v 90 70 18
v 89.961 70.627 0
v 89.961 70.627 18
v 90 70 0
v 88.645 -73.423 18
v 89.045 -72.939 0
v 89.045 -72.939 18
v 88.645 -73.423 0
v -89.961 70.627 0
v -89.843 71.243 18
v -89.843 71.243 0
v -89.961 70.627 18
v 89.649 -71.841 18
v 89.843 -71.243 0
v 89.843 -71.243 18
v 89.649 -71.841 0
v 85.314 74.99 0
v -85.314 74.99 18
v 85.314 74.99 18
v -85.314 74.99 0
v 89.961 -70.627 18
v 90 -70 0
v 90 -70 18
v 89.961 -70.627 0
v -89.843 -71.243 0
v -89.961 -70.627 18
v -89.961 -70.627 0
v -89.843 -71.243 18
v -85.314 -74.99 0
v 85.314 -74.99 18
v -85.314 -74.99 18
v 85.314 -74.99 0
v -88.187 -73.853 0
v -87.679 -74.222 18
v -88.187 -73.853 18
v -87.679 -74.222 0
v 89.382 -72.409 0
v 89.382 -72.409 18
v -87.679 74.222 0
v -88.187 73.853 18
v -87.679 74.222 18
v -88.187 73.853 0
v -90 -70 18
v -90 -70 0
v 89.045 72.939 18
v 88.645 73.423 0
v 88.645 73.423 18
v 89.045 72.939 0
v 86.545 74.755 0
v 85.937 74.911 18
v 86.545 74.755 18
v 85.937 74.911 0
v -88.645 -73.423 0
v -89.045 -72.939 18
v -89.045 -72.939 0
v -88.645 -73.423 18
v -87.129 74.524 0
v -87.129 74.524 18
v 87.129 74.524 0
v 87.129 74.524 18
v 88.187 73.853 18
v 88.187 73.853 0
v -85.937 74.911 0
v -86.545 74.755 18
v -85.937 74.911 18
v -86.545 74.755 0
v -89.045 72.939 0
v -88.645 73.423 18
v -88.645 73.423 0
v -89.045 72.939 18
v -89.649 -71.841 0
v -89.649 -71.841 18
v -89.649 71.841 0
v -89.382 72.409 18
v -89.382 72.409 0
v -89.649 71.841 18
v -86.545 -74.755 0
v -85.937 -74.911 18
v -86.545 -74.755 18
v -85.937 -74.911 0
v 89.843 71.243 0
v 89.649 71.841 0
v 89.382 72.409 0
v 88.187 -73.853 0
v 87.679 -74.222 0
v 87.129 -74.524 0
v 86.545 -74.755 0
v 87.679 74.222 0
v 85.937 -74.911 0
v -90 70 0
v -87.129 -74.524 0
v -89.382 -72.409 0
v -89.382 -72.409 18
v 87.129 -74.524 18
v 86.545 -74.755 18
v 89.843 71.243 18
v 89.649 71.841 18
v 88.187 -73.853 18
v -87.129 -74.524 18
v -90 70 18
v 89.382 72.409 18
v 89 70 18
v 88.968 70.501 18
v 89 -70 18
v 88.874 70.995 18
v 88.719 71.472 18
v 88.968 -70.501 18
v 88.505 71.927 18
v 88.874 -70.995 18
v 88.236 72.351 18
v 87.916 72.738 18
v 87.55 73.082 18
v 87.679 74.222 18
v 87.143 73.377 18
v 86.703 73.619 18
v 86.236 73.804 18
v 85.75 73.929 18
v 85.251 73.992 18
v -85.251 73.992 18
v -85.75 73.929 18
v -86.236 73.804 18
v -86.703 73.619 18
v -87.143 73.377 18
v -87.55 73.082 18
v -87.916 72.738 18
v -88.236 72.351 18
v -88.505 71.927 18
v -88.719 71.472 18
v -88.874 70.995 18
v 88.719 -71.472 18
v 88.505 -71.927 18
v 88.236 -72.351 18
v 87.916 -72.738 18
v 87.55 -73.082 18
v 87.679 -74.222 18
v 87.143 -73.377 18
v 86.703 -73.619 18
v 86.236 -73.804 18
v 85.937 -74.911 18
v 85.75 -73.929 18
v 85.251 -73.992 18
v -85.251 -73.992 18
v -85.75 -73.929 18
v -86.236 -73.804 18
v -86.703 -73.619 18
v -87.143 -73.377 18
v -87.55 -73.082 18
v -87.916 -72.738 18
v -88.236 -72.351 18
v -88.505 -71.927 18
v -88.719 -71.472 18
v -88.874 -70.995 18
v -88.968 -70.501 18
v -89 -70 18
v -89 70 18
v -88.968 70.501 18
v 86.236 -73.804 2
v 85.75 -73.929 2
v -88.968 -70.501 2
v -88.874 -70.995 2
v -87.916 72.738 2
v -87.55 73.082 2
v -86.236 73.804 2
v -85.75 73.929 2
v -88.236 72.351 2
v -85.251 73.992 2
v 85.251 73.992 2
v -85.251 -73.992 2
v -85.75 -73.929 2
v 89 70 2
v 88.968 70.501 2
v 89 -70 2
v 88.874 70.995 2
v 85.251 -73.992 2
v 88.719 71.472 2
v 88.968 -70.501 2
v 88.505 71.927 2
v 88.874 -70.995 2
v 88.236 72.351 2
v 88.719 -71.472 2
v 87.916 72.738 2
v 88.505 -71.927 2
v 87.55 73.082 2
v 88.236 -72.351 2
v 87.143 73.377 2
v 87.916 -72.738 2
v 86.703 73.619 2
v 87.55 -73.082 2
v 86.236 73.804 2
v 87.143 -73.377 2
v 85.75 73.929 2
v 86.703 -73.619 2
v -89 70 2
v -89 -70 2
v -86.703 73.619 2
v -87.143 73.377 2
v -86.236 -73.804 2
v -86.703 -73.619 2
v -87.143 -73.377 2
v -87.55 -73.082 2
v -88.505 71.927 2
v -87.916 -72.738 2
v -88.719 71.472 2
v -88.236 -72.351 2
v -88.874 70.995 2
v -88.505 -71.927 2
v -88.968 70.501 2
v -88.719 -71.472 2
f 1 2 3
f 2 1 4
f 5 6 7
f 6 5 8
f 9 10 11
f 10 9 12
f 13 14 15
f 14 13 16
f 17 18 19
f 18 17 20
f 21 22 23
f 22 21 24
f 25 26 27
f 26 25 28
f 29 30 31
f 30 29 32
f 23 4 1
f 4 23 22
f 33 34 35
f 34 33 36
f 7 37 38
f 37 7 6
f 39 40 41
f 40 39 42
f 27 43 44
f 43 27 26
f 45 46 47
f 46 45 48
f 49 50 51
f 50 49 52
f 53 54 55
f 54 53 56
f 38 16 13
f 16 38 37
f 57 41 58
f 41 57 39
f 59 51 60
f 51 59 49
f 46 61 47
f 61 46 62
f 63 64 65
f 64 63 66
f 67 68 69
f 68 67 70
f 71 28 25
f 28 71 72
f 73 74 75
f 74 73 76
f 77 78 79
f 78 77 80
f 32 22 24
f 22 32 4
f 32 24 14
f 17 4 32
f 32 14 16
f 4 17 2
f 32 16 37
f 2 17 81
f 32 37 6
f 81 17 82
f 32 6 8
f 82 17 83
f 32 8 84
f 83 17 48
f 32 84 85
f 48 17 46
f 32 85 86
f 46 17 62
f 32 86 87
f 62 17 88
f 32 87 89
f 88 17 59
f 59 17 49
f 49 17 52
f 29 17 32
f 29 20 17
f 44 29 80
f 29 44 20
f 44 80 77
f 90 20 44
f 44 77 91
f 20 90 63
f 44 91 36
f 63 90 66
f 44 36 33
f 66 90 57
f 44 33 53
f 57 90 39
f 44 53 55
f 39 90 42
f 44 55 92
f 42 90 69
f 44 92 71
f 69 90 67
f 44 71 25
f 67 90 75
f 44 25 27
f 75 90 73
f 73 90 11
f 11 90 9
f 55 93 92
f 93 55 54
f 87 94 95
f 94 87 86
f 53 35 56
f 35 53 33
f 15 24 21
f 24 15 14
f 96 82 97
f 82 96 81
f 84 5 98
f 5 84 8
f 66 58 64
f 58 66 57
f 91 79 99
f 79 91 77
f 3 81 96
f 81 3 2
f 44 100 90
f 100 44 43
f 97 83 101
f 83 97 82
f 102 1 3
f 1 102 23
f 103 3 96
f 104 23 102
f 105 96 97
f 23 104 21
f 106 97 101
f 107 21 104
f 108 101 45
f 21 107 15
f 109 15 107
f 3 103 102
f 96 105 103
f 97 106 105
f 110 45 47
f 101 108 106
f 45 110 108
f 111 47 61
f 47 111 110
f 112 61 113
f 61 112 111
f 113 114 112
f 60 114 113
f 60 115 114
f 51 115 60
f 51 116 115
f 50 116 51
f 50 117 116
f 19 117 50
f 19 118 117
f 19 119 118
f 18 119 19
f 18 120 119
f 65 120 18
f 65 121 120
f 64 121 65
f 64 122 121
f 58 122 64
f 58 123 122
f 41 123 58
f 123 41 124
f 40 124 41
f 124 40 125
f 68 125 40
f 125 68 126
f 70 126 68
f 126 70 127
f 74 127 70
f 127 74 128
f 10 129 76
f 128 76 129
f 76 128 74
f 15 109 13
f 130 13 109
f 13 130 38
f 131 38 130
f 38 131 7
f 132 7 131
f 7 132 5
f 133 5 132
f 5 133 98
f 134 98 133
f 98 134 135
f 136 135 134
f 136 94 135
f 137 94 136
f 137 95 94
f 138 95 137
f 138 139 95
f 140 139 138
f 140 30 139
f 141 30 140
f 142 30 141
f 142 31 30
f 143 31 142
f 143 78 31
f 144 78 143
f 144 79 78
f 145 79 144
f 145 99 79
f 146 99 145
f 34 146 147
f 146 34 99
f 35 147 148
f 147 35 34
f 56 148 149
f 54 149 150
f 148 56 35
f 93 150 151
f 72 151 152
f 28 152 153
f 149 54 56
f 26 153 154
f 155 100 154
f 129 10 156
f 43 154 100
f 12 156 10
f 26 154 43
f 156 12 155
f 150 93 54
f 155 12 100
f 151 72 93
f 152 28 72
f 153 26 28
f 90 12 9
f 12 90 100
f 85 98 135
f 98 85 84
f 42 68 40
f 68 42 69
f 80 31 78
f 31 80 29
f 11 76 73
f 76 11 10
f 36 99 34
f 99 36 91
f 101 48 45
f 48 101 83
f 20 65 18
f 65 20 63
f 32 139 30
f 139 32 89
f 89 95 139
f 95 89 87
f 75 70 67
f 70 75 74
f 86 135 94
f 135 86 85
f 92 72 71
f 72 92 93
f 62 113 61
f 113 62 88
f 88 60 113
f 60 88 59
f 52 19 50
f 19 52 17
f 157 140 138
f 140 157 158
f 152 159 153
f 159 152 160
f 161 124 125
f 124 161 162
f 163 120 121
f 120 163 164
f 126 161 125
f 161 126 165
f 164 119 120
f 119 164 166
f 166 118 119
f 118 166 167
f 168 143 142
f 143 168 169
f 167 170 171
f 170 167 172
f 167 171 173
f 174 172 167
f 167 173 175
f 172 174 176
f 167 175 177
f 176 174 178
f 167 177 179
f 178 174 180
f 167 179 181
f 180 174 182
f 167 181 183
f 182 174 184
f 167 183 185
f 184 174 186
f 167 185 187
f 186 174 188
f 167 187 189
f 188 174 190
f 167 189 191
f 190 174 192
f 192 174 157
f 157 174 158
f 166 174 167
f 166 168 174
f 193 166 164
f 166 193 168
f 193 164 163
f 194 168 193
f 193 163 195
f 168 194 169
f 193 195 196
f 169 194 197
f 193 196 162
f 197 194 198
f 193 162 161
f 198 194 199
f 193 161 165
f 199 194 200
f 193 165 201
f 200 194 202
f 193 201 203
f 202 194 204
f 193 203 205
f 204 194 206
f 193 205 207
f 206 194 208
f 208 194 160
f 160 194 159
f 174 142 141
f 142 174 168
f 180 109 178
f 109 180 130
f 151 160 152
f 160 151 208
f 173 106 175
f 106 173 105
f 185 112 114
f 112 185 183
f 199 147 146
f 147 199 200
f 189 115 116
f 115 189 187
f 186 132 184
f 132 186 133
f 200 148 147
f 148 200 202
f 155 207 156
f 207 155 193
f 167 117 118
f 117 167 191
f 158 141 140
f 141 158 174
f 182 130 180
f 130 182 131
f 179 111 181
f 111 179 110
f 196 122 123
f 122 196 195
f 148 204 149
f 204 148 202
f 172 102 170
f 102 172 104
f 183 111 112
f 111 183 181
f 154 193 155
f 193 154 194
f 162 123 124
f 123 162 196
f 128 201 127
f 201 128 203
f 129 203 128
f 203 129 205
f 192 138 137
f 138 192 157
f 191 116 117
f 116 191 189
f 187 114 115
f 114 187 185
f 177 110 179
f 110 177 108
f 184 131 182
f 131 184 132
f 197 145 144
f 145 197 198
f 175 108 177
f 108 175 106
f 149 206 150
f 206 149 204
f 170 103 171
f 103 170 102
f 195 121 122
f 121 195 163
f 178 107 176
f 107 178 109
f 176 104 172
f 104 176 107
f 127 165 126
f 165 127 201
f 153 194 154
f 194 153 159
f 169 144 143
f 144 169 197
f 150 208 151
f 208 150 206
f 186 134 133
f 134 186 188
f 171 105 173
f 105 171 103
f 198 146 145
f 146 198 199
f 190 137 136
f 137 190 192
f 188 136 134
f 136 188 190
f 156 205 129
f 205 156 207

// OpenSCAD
$fn = 50;


difference() {
	union() {
		hull() {
			translate(v = [-85.0000000000, 70.0000000000, 0]) {
				cylinder(h = 18, r = 5);
			}
			translate(v = [85.0000000000, 70.0000000000, 0]) {
				cylinder(h = 18, r = 5);
			}
			translate(v = [-85.0000000000, -70.0000000000, 0]) {
				cylinder(h = 18, r = 5);
			}
			translate(v = [85.0000000000, -70.0000000000, 0]) {
				cylinder(h = 18, r = 5);
			}
		}
	}
	union() {
		translate(v = [0, 0, 2]) {
			hull() {
				translate(v = [-85.0000000000, 70.0000000000, 0]) {
					cylinder(h = 16, r = 4);
				}
				translate(v = [85.0000000000, 70.0000000000, 0]) {
					cylinder(h = 16, r = 4);
				}
				translate(v = [-85.0000000000, -70.0000000000, 0]) {
					cylinder(h = 16, r = 4);
				}
				translate(v = [85.0000000000, -70.0000000000, 0]) {
					cylinder(h = 16, r = 4);
				}
			}
		}
	}
}
